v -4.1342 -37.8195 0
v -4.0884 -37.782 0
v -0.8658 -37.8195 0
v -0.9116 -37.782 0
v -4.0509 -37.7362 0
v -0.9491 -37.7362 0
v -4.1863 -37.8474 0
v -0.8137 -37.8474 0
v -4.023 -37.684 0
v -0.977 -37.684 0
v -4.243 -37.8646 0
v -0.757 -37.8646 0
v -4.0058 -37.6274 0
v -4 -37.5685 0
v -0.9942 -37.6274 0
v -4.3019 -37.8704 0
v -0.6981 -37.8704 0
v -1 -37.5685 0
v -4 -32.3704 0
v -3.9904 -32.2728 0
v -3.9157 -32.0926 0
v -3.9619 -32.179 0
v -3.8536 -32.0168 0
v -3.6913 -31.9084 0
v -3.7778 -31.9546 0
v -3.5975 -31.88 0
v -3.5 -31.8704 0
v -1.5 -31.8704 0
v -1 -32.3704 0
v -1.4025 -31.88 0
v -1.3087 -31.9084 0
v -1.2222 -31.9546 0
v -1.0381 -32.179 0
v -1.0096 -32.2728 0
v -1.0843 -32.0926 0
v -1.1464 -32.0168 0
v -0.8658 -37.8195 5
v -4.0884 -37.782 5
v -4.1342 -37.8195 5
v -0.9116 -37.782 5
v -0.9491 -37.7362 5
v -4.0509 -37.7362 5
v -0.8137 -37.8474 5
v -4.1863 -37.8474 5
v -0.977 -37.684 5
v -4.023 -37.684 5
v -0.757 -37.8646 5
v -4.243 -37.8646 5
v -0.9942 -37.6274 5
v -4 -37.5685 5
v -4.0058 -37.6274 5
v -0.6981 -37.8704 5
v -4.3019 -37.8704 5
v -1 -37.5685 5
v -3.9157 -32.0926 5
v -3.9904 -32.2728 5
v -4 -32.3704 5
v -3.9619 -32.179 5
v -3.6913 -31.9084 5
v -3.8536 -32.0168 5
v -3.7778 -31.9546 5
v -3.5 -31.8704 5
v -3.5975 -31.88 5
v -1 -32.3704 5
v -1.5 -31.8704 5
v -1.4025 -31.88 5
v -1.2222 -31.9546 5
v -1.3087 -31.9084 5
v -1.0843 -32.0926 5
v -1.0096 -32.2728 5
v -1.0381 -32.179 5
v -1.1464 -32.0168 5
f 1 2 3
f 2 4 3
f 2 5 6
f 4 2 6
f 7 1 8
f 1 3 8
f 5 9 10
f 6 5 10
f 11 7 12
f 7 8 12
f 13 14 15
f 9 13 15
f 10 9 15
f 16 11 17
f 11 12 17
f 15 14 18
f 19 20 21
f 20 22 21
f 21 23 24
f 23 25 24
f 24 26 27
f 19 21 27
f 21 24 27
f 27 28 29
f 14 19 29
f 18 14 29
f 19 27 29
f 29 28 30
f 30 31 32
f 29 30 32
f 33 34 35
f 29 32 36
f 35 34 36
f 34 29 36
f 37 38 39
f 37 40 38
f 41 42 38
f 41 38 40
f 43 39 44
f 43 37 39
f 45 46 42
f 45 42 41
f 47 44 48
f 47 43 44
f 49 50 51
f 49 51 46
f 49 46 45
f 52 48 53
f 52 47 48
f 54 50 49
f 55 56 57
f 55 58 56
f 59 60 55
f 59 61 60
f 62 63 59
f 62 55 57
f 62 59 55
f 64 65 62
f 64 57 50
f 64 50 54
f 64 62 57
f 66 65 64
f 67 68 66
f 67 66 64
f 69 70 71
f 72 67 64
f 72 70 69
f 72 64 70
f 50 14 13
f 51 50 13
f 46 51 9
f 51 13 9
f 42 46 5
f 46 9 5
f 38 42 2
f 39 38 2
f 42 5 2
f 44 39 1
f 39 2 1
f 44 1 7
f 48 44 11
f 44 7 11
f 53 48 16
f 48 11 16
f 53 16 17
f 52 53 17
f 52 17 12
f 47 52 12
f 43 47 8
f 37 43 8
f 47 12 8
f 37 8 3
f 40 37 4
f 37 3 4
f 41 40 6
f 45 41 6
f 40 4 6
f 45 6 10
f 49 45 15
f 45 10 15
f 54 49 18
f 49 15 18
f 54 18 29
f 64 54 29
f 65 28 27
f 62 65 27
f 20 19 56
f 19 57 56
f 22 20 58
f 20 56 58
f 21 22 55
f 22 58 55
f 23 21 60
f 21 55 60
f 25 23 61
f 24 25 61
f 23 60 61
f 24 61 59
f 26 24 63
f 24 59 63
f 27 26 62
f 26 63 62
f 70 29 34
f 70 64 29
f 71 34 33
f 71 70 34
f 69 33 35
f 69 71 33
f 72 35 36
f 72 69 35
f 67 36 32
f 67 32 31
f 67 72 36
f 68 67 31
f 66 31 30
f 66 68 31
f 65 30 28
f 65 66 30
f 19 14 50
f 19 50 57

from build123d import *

# Parameters (mm, degrees)
ESBO_O1_W                = 1.5
ESBO_O1_H                = 6
RESSALTO_EXTRUS_O1_DEPTH = 5
FILETE1_R                = 0.5
RESSALTO_EXTRUS_O2_DEPTH = 5


with BuildPart() as part:
    # Esboço1 → Ressalto-extrusão1 (new body)
    with BuildSketch(Plane.XY):
        with Locations((-3.25, -34.87037037)):
            Rectangle(ESBO_O1_W, ESBO_O1_H)
        with Locations((-1.75, -34.87037037)):
            Rectangle(ESBO_O1_W, ESBO_O1_H)
    extrude(amount=RESSALTO_EXTRUS_O1_DEPTH)

    # Filete1
    filete1_edges = [part.edges().sort_by_distance(p)[0] for p in [
        (-1, -31.87037037, 2.5),
        (-4, -31.87037037, 2.5),
    ]]
    fillet(filete1_edges, radius=FILETE1_R)

    # Esboço1<5> → Ressalto-extrusão2 (add, through all)
    with BuildSketch(Plane.XY):
        with BuildLine():
            Line((-4.301867323, -37.87037037), (-4, -37.87037037))
            Line((-4, -37.87037037), (-4, -37.568503047))
            ThreePointArc((-4, -37.568503047), (-4.088414892, -37.781955478), (-4.301867323, -37.87037037))
        make_face()
        with BuildLine():
            Line((-1, -37.568503047), (-1, -37.87037037))
            Line((-1, -37.87037037), (-0.698132677, -37.87037037))
            ThreePointArc((-0.698132677, -37.87037037), (-0.911585108, -37.781955478), (-1, -37.568503047))
        make_face()
    extrude(amount=RESSALTO_EXTRUS_O2_DEPTH)


solid = part.part
